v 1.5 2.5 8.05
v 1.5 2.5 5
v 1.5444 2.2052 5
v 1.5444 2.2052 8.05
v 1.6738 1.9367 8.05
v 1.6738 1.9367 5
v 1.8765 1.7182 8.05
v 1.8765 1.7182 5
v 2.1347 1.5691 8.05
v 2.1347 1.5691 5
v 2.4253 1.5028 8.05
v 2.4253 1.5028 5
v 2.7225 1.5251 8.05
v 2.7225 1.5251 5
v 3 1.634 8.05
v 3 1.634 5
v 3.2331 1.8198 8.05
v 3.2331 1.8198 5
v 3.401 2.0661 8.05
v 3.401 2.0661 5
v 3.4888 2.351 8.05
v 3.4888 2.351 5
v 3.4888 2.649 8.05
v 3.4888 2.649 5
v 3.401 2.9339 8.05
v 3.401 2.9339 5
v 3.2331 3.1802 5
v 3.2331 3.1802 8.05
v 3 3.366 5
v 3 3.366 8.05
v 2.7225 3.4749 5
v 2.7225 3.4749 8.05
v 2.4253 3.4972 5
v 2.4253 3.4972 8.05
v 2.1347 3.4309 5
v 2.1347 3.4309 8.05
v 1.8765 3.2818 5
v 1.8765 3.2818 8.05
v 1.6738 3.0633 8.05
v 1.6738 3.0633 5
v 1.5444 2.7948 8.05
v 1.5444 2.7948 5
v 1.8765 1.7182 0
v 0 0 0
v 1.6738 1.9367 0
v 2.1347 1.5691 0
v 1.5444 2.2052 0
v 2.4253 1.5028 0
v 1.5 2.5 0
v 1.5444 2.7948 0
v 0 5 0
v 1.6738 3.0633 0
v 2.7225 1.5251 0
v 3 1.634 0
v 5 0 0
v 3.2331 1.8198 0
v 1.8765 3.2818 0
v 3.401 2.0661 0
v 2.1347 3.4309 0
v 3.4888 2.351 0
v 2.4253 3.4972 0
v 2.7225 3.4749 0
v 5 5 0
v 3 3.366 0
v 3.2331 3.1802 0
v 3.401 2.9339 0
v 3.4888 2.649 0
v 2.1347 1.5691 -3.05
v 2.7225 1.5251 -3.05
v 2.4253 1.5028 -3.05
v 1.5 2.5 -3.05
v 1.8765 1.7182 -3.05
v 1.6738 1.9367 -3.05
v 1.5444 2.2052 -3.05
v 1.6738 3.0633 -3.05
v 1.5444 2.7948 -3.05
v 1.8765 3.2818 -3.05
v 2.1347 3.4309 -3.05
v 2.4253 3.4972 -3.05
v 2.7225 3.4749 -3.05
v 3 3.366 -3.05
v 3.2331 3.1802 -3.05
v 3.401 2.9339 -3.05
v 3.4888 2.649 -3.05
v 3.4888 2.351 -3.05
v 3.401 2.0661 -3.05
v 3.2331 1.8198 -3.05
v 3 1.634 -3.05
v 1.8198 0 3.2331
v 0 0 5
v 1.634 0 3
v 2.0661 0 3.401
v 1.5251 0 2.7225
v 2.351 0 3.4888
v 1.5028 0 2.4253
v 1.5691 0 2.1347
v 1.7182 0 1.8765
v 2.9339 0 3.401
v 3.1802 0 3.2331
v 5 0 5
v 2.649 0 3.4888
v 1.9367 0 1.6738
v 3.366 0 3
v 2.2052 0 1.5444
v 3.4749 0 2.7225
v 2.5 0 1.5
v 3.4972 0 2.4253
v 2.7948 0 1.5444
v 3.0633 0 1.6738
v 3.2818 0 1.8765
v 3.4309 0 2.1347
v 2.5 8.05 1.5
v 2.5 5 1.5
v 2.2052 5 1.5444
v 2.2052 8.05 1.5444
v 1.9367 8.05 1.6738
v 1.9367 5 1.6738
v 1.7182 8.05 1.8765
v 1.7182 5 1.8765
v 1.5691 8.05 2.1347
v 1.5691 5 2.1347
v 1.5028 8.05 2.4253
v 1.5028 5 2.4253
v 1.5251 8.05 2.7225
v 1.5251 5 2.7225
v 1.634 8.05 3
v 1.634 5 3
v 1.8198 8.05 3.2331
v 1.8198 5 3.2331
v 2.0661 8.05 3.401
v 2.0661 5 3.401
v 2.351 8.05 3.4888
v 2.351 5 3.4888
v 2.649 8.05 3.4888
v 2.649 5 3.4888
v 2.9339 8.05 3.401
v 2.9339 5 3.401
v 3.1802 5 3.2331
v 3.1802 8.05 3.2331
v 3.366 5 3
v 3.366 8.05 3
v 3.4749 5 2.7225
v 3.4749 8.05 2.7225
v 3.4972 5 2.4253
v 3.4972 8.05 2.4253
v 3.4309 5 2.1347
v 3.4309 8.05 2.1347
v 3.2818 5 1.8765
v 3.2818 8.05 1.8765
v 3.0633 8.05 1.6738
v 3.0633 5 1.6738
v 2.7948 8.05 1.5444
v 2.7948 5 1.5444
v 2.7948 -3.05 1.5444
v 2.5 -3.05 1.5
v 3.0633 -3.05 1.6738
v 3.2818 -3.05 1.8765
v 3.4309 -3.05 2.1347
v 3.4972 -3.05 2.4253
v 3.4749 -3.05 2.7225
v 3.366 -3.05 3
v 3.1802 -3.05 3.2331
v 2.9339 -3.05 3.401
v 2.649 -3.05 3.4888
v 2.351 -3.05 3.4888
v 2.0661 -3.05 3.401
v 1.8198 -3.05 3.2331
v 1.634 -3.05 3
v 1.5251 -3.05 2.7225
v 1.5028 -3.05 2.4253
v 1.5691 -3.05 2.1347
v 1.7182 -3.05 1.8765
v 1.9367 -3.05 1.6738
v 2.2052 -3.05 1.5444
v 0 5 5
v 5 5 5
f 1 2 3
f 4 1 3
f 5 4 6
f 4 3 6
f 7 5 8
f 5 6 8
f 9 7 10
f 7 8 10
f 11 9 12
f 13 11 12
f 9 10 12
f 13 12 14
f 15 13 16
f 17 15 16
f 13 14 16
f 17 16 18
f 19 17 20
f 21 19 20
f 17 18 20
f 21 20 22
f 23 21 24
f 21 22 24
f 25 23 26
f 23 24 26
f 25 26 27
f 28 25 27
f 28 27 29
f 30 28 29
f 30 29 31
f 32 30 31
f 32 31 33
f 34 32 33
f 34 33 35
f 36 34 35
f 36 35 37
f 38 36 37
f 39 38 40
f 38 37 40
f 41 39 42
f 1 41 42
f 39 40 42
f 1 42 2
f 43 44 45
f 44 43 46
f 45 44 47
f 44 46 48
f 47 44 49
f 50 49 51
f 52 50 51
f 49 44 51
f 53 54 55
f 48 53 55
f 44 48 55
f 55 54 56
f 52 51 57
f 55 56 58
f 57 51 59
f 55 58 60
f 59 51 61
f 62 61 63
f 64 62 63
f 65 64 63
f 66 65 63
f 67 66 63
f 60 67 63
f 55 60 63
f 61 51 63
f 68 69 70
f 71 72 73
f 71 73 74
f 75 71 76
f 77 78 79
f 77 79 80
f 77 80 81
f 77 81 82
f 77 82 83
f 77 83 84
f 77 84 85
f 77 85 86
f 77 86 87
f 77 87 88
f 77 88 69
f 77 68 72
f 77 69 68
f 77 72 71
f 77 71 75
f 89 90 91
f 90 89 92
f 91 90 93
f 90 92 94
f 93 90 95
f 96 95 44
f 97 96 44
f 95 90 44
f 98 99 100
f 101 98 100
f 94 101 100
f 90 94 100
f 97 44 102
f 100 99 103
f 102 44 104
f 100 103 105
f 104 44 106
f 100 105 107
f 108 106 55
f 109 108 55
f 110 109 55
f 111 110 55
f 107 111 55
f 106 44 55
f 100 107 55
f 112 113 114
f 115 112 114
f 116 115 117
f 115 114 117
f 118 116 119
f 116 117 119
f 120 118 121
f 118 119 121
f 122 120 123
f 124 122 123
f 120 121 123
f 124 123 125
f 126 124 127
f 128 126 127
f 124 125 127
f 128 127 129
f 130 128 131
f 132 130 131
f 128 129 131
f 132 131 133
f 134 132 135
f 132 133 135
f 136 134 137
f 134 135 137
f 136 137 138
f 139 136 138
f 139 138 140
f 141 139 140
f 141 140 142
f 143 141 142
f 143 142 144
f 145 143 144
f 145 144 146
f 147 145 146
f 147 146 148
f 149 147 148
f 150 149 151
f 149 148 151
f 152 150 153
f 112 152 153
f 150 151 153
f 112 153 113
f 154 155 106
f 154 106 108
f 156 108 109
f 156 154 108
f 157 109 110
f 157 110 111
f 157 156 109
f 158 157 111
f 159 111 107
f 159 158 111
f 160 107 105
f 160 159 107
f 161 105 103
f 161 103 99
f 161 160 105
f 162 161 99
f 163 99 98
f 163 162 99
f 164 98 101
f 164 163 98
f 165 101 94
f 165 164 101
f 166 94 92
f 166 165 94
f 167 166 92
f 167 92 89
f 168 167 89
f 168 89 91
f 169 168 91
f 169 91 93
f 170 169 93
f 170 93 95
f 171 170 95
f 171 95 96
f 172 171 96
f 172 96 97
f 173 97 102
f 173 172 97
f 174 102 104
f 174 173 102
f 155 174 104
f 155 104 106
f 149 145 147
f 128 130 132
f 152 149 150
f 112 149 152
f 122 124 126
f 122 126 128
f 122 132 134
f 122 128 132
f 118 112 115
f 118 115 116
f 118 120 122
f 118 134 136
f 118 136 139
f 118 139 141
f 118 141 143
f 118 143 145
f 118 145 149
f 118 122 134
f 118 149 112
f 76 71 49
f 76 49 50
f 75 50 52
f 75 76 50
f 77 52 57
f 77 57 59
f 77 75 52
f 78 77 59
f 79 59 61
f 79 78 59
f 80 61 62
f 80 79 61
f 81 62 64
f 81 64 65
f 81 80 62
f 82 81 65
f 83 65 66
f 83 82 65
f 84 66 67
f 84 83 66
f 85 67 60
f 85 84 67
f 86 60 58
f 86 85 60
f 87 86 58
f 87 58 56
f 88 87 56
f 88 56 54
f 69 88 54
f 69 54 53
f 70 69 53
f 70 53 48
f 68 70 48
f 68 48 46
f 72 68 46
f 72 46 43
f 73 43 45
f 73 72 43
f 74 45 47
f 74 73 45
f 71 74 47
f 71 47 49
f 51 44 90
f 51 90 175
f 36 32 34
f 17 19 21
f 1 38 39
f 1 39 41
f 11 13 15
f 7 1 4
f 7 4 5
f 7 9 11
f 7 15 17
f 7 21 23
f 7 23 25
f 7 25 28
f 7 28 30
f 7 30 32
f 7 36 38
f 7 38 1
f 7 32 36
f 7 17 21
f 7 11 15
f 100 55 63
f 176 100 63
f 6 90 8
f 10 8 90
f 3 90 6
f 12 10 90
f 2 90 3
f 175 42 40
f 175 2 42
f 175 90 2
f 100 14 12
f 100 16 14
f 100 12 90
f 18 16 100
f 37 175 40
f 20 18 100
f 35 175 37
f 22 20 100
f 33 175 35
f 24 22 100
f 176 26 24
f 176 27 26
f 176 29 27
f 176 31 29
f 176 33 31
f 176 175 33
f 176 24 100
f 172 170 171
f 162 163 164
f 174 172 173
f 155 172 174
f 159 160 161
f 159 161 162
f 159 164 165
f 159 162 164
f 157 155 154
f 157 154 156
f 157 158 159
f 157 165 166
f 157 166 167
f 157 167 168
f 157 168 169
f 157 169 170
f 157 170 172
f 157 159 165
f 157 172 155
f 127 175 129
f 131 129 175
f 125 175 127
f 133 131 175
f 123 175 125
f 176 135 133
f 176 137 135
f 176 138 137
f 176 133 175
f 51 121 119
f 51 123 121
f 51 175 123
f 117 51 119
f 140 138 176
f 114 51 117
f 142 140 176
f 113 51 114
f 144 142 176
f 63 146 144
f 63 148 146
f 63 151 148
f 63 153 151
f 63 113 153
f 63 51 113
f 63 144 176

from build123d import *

# Parameters (mm, degrees)
ESQUISSE1_W        = 5
ESQUISSE1_H        = 5
BOSS_EXTRU_1_DEPTH = 5
ESQUISSE2_R        = 1
BOSS_EXTRU_2_DEPTH = 3.05
BOSS_EXTRU_3_START = 3.05
ESQUISSE3_R        = 1
BOSS_EXTRU_3_DEPTH = 3.05
ESQUISSE4_R        = 1
BOSS_EXTRU_4_DEPTH = 3.05
BOSS_EXTRU_5_START = 3.05
ESQUISSE5_R        = 1
BOSS_EXTRU_5_DEPTH = 3.05


with BuildPart() as part:
    # Esquisse1 → Boss.-Extru.1 (new body)
    with BuildSketch(Plane.XY):
        with Locations((2.5, 2.5)):
            Rectangle(ESQUISSE1_W, ESQUISSE1_H)
    extrude(amount=BOSS_EXTRU_1_DEPTH)

    # Esquisse2 → Boss.-Extru.2 (add)
    with BuildSketch(Plane(origin=(0, 5, 0), x_dir=(1, 0, 0), z_dir=(0, 1, 0))):
        with Locations(Location((2.5, -2.5, 0), (0, 0, 90))):
            Circle(ESQUISSE2_R)
    extrude(amount=BOSS_EXTRU_2_DEPTH)

    # Esquisse3 → Boss.-Extru.3 (add)
    with BuildSketch(Plane.XZ.offset(BOSS_EXTRU_3_START)):
        with Locations(Location((2.5, 2.5, 0), (0, 0, 270))):
            Circle(ESQUISSE3_R)
    extrude(amount=-BOSS_EXTRU_3_DEPTH)

    # Esquisse4 → Boss.-Extru.4 (add)
    with BuildSketch(Plane.XY.offset(5)):
        with Locations(Location((2.5, 2.5, 0), (0, 0, 180))):
            Circle(ESQUISSE4_R)
    extrude(amount=BOSS_EXTRU_4_DEPTH)

    # Esquisse5 → Boss.-Extru.5 (add)
    with BuildSketch(Plane(origin=(0, 0, 0), x_dir=(-1, 0, 0), z_dir=(0, 0, -1)).offset(BOSS_EXTRU_5_START)):
        with Locations((-2.5, 2.5)):
            Circle(ESQUISSE5_R)
    extrude(amount=-BOSS_EXTRU_5_DEPTH)


solid = part.part
